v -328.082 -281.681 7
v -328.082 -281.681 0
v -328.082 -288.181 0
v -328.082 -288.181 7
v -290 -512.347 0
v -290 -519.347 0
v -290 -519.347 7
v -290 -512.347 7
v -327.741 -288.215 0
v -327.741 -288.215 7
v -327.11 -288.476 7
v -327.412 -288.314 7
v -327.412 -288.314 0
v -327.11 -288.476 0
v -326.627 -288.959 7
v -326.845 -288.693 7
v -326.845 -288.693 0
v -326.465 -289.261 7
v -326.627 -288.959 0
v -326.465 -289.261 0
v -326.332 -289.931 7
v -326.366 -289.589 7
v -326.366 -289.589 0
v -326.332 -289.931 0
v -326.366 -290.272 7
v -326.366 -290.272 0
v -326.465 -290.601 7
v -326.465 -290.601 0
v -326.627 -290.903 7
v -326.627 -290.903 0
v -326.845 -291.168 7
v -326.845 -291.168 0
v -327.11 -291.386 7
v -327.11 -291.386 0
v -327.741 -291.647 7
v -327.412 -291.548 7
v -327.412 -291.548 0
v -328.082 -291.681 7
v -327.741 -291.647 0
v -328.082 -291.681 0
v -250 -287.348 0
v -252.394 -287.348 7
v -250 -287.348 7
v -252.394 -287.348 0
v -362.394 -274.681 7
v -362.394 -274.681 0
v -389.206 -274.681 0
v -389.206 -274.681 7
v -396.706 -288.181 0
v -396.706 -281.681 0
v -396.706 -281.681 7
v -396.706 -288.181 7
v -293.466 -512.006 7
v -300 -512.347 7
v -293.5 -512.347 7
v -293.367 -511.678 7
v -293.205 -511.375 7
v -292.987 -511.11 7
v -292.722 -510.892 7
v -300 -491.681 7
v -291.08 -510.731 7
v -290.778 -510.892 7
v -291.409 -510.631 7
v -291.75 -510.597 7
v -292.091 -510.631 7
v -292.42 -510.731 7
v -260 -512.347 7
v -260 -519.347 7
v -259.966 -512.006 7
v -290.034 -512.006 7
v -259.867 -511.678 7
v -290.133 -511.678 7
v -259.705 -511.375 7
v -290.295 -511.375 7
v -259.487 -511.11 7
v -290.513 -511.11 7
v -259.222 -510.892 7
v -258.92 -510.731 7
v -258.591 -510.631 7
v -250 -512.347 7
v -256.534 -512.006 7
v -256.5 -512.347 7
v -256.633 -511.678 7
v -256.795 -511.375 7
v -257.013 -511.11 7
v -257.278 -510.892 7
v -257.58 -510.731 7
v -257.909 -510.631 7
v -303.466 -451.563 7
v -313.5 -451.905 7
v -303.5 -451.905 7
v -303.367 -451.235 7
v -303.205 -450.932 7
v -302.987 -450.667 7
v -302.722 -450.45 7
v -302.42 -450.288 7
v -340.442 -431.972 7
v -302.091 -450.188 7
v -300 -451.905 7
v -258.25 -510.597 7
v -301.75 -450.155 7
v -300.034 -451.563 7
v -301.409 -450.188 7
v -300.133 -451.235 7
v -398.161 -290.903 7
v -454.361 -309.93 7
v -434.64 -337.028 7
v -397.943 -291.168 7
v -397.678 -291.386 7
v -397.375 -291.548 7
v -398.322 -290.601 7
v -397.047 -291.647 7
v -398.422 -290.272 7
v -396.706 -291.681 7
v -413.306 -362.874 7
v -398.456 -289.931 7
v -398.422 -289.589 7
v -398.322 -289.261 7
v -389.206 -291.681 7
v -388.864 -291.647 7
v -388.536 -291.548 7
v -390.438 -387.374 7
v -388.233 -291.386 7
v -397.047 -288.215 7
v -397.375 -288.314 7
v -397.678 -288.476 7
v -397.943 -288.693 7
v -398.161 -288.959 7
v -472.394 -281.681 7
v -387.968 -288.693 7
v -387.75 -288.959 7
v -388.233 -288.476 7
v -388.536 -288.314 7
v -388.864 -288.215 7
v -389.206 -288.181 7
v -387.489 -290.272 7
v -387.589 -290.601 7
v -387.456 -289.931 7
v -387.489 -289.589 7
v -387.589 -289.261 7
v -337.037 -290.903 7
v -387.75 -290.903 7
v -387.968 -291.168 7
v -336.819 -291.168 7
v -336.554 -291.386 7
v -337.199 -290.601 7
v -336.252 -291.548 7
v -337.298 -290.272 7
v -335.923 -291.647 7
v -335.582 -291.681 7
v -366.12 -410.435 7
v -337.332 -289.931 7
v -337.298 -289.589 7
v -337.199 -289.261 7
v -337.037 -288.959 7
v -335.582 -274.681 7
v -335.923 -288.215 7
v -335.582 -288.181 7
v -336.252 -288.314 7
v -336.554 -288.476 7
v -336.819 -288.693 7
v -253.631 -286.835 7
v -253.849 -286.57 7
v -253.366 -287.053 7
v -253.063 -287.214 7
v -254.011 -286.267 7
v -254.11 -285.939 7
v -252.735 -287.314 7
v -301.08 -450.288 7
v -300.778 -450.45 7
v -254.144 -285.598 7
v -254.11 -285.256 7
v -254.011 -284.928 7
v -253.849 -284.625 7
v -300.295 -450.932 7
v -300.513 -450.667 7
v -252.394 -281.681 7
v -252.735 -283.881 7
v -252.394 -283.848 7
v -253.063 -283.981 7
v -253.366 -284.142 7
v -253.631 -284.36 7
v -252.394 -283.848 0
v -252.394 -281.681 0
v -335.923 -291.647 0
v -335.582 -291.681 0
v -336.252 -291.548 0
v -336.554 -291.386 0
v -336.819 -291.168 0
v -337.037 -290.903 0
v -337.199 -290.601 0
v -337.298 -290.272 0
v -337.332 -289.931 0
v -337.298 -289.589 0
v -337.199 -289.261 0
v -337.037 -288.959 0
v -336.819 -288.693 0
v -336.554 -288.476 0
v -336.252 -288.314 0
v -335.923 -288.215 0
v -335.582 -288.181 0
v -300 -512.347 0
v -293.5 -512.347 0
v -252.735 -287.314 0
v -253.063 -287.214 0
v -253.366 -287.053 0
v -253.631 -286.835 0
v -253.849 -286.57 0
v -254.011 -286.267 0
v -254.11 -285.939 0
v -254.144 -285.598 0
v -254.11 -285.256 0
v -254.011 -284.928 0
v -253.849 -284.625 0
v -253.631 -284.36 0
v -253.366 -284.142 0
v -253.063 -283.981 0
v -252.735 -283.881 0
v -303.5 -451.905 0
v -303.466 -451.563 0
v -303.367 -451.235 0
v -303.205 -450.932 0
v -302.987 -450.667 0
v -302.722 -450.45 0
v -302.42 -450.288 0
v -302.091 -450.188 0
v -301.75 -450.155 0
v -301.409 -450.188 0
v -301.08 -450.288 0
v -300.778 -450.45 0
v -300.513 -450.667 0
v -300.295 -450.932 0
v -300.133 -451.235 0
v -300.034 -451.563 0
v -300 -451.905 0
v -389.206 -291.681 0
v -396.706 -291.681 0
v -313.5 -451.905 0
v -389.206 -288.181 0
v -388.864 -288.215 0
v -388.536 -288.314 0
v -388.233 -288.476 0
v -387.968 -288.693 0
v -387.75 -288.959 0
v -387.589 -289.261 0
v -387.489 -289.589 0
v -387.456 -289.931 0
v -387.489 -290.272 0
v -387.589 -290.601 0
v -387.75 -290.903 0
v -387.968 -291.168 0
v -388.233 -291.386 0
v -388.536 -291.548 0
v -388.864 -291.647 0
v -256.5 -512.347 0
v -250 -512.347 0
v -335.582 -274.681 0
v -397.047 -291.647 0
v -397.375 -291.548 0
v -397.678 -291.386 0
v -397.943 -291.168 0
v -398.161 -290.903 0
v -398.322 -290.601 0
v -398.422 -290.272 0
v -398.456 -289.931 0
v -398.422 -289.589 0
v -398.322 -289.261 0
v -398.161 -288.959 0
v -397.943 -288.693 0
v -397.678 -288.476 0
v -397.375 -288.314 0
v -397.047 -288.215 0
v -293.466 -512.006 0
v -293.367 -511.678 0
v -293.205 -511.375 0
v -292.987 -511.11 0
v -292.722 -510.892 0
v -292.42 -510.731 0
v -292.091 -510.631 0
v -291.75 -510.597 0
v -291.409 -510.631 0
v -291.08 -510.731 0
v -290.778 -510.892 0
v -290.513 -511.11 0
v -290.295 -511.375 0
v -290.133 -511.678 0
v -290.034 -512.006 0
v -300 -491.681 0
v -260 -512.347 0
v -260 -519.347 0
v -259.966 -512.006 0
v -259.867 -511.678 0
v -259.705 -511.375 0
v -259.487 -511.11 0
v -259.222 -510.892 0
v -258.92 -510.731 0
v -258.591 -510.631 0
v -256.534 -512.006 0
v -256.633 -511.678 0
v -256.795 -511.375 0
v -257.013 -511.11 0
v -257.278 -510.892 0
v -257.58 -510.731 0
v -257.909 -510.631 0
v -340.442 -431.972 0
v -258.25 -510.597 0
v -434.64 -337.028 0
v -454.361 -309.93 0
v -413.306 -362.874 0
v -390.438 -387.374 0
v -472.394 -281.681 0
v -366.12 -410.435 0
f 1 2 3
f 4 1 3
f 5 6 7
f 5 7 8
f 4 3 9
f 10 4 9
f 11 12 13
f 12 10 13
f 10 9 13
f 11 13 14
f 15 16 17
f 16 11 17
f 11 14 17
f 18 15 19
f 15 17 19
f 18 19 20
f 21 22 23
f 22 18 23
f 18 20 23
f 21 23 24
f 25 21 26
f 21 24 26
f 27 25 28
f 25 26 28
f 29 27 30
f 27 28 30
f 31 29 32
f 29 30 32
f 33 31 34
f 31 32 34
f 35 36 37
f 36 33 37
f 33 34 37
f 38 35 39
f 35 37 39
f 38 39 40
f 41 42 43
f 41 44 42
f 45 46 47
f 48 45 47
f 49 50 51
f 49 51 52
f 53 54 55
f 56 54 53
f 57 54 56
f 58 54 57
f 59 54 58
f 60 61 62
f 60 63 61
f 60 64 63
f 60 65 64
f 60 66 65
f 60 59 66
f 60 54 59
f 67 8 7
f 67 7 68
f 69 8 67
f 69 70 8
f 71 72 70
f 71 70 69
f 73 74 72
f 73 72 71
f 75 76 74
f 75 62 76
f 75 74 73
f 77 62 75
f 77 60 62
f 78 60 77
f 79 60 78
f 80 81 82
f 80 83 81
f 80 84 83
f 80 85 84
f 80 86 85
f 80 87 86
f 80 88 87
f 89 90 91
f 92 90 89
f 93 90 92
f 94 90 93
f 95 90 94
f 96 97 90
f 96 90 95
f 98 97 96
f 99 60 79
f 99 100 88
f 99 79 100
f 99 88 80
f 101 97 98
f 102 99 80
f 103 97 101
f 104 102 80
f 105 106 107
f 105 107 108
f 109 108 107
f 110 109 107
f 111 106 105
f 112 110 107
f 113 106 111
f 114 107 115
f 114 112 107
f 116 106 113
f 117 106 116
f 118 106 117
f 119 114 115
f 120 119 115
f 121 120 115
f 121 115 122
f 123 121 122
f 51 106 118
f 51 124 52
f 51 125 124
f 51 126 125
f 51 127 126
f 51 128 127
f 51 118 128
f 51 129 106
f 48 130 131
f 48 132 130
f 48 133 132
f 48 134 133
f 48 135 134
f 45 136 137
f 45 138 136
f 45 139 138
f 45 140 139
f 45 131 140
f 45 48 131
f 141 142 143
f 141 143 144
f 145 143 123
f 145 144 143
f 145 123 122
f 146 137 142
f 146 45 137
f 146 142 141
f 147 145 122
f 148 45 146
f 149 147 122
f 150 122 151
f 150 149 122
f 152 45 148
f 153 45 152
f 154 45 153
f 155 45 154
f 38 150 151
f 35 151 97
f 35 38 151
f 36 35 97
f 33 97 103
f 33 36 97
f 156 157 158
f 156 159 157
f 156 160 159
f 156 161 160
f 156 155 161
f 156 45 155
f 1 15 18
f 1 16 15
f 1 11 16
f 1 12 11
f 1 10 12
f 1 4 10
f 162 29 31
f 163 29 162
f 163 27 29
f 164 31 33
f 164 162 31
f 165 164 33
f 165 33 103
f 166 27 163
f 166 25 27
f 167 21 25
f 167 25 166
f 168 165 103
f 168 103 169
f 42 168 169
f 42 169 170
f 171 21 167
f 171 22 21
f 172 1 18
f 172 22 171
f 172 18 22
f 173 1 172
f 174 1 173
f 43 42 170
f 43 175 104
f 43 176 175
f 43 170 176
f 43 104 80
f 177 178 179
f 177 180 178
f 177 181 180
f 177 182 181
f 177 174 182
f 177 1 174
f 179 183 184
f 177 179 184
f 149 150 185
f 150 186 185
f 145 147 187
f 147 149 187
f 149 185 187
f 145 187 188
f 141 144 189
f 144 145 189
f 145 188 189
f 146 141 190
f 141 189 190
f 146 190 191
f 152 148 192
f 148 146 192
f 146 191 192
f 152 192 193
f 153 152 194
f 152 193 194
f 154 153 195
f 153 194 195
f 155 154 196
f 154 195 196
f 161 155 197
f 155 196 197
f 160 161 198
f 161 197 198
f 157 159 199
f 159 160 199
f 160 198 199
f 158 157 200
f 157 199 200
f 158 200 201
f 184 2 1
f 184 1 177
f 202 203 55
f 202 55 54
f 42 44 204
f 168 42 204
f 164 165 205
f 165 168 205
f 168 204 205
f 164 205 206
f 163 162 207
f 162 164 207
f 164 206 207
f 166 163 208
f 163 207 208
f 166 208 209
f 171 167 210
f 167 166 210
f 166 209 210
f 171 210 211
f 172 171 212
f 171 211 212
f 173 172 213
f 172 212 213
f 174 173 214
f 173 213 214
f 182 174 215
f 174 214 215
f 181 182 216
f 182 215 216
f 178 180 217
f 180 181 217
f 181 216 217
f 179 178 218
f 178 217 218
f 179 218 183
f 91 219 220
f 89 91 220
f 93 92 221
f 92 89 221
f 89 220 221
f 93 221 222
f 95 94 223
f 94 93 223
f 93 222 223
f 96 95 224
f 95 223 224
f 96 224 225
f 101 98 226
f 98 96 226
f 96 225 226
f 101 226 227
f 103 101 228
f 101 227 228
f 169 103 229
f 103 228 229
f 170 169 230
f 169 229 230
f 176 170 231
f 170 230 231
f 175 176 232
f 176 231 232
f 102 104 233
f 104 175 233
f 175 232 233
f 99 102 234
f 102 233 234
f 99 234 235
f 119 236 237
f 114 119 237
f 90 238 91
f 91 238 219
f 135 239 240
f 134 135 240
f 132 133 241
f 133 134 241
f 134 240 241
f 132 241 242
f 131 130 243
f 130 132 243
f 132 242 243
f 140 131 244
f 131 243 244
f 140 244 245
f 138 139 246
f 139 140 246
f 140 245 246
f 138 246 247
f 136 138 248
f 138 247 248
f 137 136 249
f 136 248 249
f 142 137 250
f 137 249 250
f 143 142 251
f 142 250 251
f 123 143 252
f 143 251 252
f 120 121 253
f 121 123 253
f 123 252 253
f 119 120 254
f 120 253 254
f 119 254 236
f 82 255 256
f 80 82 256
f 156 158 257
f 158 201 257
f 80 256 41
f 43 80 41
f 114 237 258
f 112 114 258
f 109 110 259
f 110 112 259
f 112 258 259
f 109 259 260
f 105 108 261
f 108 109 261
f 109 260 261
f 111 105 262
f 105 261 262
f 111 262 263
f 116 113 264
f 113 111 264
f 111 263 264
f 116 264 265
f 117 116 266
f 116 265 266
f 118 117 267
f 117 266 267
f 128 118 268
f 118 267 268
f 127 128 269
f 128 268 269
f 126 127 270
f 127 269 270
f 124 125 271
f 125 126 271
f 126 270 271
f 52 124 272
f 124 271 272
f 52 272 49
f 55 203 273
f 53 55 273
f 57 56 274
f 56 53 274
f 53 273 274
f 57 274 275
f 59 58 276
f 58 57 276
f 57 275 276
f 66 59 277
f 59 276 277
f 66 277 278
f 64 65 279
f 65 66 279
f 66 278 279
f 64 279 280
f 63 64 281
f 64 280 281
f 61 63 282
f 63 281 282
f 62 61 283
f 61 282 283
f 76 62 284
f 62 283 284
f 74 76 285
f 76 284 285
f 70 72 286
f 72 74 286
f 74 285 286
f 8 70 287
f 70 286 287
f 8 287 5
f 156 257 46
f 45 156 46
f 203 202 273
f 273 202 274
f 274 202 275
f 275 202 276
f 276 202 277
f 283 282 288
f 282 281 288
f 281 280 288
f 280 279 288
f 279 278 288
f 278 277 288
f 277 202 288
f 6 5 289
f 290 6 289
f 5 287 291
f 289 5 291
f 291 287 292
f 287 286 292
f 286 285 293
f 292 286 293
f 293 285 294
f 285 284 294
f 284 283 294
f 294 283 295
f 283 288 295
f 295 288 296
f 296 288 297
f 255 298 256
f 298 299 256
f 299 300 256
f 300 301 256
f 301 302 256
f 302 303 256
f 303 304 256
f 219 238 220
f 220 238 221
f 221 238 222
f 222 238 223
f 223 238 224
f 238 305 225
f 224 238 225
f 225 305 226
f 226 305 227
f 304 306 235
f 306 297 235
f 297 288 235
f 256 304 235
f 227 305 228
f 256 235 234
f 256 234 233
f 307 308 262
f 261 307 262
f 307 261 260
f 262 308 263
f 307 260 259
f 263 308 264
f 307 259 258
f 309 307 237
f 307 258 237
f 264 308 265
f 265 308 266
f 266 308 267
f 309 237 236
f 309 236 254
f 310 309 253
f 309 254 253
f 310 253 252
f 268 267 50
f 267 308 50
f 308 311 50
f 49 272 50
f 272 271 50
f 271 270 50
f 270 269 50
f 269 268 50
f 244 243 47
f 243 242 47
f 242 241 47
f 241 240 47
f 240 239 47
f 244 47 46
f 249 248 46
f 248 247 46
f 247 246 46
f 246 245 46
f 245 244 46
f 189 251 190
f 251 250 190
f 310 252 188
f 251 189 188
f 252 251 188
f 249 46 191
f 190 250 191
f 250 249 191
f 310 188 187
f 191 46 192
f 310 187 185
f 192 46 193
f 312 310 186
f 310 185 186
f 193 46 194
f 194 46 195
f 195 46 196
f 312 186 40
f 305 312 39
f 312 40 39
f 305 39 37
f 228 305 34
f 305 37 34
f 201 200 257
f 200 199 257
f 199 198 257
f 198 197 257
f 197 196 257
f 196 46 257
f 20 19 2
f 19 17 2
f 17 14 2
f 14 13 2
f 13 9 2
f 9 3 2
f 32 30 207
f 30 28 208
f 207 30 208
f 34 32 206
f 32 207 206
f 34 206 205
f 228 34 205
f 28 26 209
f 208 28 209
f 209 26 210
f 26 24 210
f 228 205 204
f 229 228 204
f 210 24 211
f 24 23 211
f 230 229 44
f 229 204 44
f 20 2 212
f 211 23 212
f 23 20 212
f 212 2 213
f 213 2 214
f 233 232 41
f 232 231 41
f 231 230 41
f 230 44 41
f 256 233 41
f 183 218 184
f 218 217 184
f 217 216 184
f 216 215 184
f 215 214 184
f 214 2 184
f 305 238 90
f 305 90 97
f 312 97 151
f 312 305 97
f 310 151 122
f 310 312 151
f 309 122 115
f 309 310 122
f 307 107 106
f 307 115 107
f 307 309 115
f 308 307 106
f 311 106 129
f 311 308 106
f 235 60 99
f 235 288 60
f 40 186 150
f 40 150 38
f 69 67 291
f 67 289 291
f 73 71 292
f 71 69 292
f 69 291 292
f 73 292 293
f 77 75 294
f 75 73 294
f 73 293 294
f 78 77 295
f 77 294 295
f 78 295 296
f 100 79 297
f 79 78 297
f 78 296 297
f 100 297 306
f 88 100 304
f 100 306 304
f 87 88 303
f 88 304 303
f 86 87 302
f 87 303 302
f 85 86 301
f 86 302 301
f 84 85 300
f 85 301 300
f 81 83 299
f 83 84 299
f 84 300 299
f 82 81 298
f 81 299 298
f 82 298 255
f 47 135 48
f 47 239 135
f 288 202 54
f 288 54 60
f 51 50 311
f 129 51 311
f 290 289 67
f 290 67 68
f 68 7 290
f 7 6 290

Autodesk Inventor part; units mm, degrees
ref_plane "YZ Plane" through (0, 0, 0) normal (1, 0, 0) x (0, 1, 0)
ref_plane "XZ Plane" through (0, 0, 0) normal (0, 1, 0) x (-1, 0, 0)
ref_plane "XY Plane" through (0, 0, 0) normal (0, 0, 1) x (1, 0, 0)
sketch "Sketch1" plane through (0, 0, 0) normal (0, 0, 1) x (1, 0, 0)
  arc A0 (0, 550) -> (-200, 512.3475) centre (0, 0) ccw construction
  line L0 (-472.3938, -281.6809) -> (-252.3938, -281.6809) construction
  line L1 (-489.0365, 251.6809) -> (-252.3938, 251.6809) construction
  line L2 (-150, 323.3356) -> (-150, 512.3475) construction
  line L3 (-472.3938, 281.6809) -> (-252.3938, 281.6809) construction
  line L4 (-472.3938, -251.6809) -> (-252.3938, -251.6809) construction
  line L5 (-356.435, 15) -> (-576.435, 15) construction
  line L6 (-472.3938, -281.6809) -> (-472.3938, -251.6809) construction
  line L7 (-252.3938, -281.6809) -> (-252.3938, -251.6809) construction
  line L8 (-252.3938, 281.6809) -> (-252.3938, 251.6809) construction
  line L9 (-472.3938, 281.6809) -> (-472.3938, 251.6809) construction
  line L10 (-356.435, 15) -> (-356.435, -15) construction
  line L11 (-356.435, -15) -> (-576.435, -15) construction
  line L12 (-576.435, -15) -> (-576.435, 15) construction
  arc A1 (0, 356.435) -> (-150, 323.3356) centre (0, 0) ccw construction
  arc A2 (-150, -323.3356) -> (0, -356.435) centre (0, 0) ccw construction
  arc A3 (-256.5, -512.3475) -> (-260, -512.3475) centre (-258.25, -512.3475) ccw
  arc A4 (-290, -512.3475) -> (-293.5, -512.3475) centre (-291.75, -512.3475) ccw
  line L13 (-356.1192, -15) -> (-549.7954, -15) construction
  line L14 (-252.3938, 251.6809) -> (-489.0365, 251.6809) construction
  arc A5 (-192.6667, 512.3475) -> (-190, 512.3475) centre (-191.3333, 512.3475) ccw construction
  line L15 (-157.3333, 512.3475) -> (-150, 512.3475) construction
  line L16 (-192.6667, 512.3475) -> (-200, 512.3475) construction
  arc A6 (-160, 512.3475) -> (-157.3333, 512.3475) centre (-158.6667, 512.3475) ccw construction
  line L17 (-171.25, 517.8475) -> (-175, 517.8475) construction
  line L18 (-171.25, 520.5142) -> (-171.25, 525.1809) construction
  line L19 (-161.3333, 532.3475) -> (-188.6667, 532.3475) construction
  line L20 (-190, 531.0142) -> (-190, 512.3475) construction
  line L21 (-160, 531.0142) -> (-160, 512.3475) construction
  arc A7 (-160, 531.0142) -> (-161.3333, 532.3475) centre (-161.3333, 531.0142) ccw construction
  arc A8 (-188.6667, 532.3475) -> (-190, 531.0142) centre (-188.6667, 531.0142) ccw construction
  line L22 (-171.25, 527.8475) -> (-175, 527.8475) construction
  line L23 (-175, 532.3475) -> (-175, 535.9358) construction
  line L24 (-175, 517.8475) -> (-175, 527.8475) construction
  arc A9 (-171.25, 517.8475) -> (-171.25, 520.5142) centre (-171.25, 519.1809) ccw construction
  arc A10 (-171.25, 525.1809) -> (-171.25, 527.8475) centre (-171.25, 526.5142) ccw construction
  line L25 (-178.75, 517.8475) -> (-175, 517.8475) construction
  arc A11 (-178.75, 520.5142) -> (-178.75, 517.8475) centre (-178.75, 519.1809) ccw construction
  line L26 (-178.75, 520.5142) -> (-178.75, 525.1809) construction
  arc A12 (-178.75, 527.8475) -> (-178.75, 525.1809) centre (-178.75, 526.5142) ccw construction
  line L27 (-178.75, 527.8475) -> (-175, 527.8475) construction
  line L28 (-362.3938, -251.6809) -> (-362.3938, -293.6041)
  arc A13 (-389.2055, -291.6809) -> (-389.2055, -288.1809) centre (-389.2055, -289.9309) ccw
  line L29 (-389.2055, -291.6809) -> (-396.7055, -291.6809)
  line L30 (-396.7055, -281.6809) -> (-472.3938, -281.6809)
  line L31 (-328.082, -281.6809) -> (-252.3938, -281.6809)
  line L32 (-252.3938, -287.3475) -> (-250, -287.3475)
  arc A14 (-150, 323.3356) -> (-252.3938, -251.6809) centre (0, 0) ccw construction
  arc A15 (-200, 512.3475) -> (-472.3938, -281.6809) centre (0, 0) ccw construction
  line L33 (-300, -512.3475) -> (-300, -491.6809)
  line L34 (-260, -512.3475) -> (-260, -519.3475)
  line L35 (-290, -519.3475) -> (-290, -512.3475)
  line L36 (-256.5, -512.3475) -> (-250, -512.3475)
  line L37 (-293.5, -512.3475) -> (-300, -512.3475)
  arc A16 (-396.7055, -288.1809) -> (-396.7055, -291.6809) centre (-396.7055, -289.9309) ccw
  line L38 (-396.7055, -281.6809) -> (-396.7055, -288.1809)
  line L39 (-389.2055, -288.1809) -> (-389.2055, -274.6809)
  arc A17 (-335.582, -288.1809) -> (-335.582, -291.6809) centre (-335.582, -289.9309) ccw
  line L40 (-335.582, -291.6809) -> (-328.082, -291.6809)
  arc A18 (-328.082, -291.6809) -> (-328.082, -288.1809) centre (-328.082, -289.9309) ccw
  line L41 (-328.082, -281.6809) -> (-328.082, -288.1809)
  line L42 (-335.582, -288.1809) -> (-335.582, -274.6809)
  arc A19 (-252.3938, -283.8475) -> (-252.3938, -287.3475) centre (-252.3938, -285.5975) ccw
  line L43 (-252.3938, -283.8475) -> (-252.3938, -281.6809)
  line L44 (-335.582, -274.6809) -> (-389.2055, -274.6809)
  arc A20 (-472.3938, -281.6809) -> (-313.5, -451.9046) centre (0, 0) ccw
  line L45 (-250, -512.3475) -> (-250, -287.3475)
  line L46 (-300, -491.6809) -> (-300, -451.9046)
  arc A21 (-300, -451.9046) -> (-303.5, -451.9046) centre (-301.75, -451.9046) ccw
  line L47 (-313.5, -451.9046) -> (-303.5, -451.9046)
  line L48 (-290, -519.3475) -> (-260, -519.3475)
  point P0 (0, 512.3475)
  point P1 (0, -512.3475)
  point P2 (-59.9119, -534.1417)
  point P3 (-160, 532.3475)
  point P4 (-190, 532.3475)
  point P5 (-335.582, -268.123)
  point P6 (-389.2055, -268.123)
  dimension "d13" = 550
  dimension "d17" = 200
  dimension "d18" = 0
  dimension "d54" = 220
  dimension "d56" = 220
  dimension "d57" = 30
  dimension "d59" = 30
  dimension "d62" = 252.3938
  dimension "d73" = 236.6809
  dimension "d74" = 236.6809
  dimension "d75" = 576.435
  dimension "d76" = 472.3938
  dimension "d77" = 472.3938
  dimension "d78" = 30
  dimension "d81" = 220
  dimension "d82" = 252.3938
  dimension "d85" = 356.435
  dimension "d88" = 3.5
  dimension "d91" = 3.5
  dimension "d105" = 2.6667
  dimension "d106" = 30
  dimension "d107" = 20
  dimension "d108" = 2.6667
  dimension "d109" = 1.3333
  dimension "d110" = 7.3333
  dimension "d111" = 7.3333
  dimension "d112" = 7.5
  dimension "d113" = 3.75
  dimension "d114" = 3.75
  dimension "d140" = 7.5
  dimension "d171" = 1.75
  dimension "d172" = 10
  dimension "d173" = 3.5
  dimension "d176" = 7
  dimension "d179" = 230.6667
  dimension "d182" = 3.5
  dimension "d183" = 7
extrude "Extrusion1" add sketch "Sketch1" along normal blind 7
properties part number "Support A1 - V2"
